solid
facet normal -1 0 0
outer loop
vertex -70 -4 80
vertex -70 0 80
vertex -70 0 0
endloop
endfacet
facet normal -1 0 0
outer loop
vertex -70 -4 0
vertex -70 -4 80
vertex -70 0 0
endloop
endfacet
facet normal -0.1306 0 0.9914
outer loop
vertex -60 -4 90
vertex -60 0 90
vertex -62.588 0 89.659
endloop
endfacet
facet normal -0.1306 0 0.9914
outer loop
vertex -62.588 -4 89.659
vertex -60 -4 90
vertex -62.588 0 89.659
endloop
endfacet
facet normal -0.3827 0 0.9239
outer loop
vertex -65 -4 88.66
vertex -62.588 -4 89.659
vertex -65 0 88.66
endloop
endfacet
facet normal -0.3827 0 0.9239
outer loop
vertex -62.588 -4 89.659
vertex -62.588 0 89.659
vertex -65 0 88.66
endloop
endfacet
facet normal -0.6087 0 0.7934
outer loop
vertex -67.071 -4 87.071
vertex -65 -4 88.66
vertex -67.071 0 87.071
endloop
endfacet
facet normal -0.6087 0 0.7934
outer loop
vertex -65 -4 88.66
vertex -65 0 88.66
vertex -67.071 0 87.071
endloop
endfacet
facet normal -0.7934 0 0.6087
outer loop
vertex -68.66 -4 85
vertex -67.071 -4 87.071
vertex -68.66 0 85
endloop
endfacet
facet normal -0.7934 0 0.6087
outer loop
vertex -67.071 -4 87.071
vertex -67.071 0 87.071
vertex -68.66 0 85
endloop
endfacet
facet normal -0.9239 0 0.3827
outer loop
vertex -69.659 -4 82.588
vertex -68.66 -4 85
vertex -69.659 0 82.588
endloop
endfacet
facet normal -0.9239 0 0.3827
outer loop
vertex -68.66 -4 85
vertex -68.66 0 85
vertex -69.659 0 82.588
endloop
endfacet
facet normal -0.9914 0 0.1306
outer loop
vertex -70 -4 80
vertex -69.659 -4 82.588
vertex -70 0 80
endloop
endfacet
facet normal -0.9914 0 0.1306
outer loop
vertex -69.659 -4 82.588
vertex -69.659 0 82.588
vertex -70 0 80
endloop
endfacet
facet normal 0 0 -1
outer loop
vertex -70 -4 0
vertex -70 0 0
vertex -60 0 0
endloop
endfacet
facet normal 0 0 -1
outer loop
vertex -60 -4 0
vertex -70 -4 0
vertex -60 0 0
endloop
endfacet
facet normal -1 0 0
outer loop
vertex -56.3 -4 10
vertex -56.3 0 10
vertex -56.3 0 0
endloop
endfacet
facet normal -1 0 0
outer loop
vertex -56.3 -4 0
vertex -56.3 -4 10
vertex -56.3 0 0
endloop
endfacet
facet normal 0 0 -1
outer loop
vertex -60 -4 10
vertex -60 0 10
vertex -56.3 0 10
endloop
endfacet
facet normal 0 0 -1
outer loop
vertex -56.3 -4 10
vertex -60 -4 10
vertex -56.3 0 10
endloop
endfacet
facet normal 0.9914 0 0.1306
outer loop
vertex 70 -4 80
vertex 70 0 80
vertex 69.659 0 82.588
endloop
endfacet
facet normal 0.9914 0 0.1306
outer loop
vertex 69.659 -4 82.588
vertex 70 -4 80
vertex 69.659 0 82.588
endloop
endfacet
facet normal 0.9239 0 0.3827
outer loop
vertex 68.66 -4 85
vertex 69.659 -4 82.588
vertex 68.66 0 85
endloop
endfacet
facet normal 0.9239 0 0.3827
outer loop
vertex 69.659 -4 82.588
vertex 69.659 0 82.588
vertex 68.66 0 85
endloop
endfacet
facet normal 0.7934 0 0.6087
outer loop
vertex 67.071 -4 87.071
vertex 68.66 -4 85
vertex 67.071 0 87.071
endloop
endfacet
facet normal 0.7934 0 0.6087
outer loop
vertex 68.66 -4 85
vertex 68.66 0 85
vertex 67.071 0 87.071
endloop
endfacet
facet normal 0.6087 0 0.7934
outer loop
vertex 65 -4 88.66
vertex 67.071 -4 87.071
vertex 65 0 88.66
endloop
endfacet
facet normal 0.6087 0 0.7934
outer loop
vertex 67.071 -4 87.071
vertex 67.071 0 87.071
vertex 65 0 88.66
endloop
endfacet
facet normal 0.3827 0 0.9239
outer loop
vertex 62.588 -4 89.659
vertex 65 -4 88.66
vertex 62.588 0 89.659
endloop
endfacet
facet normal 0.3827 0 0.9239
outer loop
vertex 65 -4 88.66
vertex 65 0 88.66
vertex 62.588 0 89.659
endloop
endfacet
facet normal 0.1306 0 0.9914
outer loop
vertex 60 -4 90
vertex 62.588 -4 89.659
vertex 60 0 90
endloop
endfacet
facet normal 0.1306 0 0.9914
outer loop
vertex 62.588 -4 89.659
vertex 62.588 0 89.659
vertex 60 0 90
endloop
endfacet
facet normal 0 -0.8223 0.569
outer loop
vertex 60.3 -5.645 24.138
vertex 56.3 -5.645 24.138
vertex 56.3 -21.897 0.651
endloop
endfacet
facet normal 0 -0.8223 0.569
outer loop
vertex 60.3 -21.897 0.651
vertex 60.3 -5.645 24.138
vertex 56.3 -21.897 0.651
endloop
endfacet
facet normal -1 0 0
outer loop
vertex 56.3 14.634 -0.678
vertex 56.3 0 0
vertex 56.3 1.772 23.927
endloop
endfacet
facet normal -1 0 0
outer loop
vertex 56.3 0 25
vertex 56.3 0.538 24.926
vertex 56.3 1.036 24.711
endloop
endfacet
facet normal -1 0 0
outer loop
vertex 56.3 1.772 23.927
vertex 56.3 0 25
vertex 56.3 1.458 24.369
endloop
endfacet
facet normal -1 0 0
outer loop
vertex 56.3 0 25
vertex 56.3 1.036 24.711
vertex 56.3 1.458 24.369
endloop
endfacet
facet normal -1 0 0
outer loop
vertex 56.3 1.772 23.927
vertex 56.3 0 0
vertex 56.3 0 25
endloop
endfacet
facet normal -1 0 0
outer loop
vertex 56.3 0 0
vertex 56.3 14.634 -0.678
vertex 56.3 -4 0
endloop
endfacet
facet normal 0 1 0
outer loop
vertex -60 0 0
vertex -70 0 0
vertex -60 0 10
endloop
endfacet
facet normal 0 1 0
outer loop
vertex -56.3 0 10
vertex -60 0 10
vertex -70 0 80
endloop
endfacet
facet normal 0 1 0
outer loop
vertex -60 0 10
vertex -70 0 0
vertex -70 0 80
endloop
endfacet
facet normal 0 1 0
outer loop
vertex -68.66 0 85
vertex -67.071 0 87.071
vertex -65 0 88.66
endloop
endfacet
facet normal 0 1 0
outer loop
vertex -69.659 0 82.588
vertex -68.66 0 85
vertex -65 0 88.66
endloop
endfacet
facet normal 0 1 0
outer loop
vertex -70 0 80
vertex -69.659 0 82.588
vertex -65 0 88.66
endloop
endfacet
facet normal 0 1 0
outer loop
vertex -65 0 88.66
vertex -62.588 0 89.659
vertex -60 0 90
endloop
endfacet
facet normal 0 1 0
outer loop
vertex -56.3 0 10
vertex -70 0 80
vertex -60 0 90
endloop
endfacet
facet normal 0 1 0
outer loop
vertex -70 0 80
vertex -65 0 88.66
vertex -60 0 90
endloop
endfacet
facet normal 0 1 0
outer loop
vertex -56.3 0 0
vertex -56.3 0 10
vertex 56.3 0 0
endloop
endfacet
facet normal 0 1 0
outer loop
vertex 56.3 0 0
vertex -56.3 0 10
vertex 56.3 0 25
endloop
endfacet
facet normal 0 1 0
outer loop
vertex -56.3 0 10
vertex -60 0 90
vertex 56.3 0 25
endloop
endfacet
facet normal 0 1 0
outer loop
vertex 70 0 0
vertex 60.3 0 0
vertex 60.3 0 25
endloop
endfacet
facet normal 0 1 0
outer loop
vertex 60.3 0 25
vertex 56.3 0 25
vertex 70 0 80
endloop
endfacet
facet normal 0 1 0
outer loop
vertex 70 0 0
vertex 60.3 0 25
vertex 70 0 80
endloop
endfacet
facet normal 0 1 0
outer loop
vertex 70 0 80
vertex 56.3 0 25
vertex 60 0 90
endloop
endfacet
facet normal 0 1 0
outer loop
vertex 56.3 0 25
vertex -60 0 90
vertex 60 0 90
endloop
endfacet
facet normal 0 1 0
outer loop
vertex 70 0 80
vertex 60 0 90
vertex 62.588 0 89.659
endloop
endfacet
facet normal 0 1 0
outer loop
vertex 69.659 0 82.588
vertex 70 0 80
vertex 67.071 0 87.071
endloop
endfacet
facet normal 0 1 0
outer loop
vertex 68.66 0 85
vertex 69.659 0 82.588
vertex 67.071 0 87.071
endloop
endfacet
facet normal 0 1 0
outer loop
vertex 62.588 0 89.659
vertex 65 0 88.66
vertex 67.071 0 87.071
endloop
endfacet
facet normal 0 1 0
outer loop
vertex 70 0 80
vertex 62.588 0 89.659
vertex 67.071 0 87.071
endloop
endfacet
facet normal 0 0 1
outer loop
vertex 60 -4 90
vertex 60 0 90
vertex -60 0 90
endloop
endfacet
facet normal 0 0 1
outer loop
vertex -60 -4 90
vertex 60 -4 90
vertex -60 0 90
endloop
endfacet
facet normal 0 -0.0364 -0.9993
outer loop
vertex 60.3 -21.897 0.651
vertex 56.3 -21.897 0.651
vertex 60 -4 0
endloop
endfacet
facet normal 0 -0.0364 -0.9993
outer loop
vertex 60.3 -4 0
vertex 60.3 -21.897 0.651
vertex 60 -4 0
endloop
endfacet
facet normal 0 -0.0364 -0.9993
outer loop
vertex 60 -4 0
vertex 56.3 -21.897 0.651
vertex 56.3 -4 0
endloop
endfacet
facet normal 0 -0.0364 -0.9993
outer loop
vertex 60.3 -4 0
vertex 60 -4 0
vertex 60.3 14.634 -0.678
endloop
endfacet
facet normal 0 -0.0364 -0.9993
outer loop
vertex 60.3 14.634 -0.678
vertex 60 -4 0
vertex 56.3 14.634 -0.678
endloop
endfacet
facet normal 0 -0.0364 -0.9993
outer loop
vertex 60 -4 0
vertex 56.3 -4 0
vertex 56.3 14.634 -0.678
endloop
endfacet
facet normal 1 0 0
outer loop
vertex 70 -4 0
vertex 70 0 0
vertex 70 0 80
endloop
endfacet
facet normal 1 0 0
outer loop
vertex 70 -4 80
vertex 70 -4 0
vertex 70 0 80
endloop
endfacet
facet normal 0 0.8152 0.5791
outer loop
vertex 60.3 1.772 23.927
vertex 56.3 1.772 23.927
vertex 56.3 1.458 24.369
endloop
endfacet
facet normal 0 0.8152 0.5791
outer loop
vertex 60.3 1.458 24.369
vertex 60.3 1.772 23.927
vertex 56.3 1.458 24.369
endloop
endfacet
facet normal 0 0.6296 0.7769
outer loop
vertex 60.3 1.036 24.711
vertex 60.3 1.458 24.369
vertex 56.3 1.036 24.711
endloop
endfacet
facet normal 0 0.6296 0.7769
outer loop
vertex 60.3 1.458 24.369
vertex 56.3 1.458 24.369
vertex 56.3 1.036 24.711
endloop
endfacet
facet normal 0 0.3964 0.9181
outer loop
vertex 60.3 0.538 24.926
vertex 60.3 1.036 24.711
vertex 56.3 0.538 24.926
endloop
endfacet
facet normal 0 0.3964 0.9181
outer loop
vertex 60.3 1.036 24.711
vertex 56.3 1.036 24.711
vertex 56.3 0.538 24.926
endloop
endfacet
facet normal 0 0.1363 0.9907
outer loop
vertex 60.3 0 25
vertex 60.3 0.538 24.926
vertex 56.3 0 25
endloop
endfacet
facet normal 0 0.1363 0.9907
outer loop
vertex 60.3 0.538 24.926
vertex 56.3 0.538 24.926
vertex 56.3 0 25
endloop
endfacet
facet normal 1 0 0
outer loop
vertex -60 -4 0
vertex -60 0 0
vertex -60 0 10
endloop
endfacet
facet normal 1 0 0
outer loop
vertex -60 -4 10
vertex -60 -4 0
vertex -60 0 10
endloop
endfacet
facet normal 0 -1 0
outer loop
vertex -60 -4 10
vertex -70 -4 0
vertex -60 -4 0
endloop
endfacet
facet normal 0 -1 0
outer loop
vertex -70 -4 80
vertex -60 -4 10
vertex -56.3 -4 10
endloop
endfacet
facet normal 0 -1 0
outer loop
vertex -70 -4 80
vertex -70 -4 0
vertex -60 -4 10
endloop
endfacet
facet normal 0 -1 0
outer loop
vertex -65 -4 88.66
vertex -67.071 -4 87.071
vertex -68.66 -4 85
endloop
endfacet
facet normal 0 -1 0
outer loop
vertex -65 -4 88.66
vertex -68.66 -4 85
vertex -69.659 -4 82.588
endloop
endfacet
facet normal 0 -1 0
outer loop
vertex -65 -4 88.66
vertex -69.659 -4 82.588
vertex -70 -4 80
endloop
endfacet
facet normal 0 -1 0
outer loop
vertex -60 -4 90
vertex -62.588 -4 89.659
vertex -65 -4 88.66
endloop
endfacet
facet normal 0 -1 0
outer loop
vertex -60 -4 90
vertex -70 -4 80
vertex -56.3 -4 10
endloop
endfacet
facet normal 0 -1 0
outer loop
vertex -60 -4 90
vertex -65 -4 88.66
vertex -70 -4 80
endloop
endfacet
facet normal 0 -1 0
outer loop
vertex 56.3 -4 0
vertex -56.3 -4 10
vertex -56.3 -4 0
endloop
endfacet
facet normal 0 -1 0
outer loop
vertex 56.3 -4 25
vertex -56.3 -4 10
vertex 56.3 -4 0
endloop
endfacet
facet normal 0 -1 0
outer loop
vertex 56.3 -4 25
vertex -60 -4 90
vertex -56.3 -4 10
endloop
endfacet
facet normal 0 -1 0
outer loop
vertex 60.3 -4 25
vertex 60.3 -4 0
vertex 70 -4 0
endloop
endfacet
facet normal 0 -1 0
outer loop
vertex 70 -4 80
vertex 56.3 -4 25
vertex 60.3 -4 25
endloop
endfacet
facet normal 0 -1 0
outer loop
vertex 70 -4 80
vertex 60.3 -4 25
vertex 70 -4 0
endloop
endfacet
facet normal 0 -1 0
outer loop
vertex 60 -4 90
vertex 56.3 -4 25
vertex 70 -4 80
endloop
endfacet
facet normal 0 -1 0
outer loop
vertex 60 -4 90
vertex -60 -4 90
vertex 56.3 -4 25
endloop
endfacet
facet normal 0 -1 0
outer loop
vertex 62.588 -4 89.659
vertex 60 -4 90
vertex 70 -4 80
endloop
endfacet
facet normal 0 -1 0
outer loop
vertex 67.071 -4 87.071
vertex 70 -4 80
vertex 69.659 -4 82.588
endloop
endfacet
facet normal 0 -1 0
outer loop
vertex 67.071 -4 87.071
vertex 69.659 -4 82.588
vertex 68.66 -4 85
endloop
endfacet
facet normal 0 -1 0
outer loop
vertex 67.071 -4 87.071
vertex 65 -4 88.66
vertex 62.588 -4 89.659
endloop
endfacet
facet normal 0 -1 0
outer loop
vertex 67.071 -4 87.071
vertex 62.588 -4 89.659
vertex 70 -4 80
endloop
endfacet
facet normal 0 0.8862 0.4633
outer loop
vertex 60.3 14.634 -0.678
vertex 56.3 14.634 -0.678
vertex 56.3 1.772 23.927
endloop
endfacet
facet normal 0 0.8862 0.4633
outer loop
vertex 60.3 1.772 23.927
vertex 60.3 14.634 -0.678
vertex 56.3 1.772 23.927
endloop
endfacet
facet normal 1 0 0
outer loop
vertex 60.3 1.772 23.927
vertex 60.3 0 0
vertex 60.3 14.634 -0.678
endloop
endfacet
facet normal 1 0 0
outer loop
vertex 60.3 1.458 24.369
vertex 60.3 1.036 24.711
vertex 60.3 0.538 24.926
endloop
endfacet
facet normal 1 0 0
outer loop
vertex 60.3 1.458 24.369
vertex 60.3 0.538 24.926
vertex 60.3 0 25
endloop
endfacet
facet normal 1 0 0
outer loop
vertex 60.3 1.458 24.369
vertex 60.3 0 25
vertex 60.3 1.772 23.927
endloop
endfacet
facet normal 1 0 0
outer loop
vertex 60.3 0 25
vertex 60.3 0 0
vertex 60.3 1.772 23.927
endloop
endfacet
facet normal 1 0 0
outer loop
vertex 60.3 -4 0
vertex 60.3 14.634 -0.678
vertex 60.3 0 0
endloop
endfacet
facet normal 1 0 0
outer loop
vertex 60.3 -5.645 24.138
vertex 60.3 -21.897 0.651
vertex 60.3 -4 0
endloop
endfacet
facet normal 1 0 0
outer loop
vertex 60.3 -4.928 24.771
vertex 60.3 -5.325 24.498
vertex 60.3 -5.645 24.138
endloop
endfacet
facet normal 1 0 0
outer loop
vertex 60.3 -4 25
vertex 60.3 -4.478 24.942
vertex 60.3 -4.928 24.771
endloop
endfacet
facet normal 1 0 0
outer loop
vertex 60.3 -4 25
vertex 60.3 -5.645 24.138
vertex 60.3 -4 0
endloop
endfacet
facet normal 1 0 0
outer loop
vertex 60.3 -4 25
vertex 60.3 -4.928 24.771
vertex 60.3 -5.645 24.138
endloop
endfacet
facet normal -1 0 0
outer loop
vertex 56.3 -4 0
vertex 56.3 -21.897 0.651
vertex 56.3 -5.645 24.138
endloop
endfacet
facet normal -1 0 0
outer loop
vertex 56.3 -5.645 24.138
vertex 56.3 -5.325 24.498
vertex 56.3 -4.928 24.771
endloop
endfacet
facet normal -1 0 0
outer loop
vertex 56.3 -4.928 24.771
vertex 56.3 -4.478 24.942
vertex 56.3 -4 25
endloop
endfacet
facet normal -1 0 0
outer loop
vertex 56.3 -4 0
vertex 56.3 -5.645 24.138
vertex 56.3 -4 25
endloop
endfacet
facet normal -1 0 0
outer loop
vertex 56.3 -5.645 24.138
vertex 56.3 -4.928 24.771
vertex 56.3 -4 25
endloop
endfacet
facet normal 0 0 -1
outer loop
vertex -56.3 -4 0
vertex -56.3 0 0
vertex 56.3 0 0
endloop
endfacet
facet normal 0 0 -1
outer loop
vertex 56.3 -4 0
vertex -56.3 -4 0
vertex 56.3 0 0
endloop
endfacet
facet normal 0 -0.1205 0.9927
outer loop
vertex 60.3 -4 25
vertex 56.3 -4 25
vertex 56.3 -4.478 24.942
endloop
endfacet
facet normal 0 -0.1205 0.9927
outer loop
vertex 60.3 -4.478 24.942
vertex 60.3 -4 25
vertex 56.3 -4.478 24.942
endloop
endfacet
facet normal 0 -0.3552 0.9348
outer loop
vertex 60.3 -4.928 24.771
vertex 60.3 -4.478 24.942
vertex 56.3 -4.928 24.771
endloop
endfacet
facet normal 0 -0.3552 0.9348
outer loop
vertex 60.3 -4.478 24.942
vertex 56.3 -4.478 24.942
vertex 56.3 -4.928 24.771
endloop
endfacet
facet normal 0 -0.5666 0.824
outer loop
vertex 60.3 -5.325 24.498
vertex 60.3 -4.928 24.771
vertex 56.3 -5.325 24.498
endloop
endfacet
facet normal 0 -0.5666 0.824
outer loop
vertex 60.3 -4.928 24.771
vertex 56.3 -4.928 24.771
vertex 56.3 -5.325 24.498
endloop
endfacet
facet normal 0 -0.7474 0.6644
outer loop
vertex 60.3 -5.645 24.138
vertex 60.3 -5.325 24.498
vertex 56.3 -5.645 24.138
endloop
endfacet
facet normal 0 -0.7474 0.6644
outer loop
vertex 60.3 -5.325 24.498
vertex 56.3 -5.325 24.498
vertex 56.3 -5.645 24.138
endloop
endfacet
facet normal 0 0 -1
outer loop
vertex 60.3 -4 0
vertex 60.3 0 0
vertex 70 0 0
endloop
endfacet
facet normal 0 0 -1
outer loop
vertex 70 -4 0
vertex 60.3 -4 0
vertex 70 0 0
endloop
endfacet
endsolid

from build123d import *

# Parameters (mm, degrees)
F1_DEPTH = 4
F3_DEPTH = 4


with BuildPart() as f1:
    # F0 (on Front) → F1 (new body)
    with BuildSketch(Plane.XZ):
        with BuildLine():
            Line((60, 90), (-60, 90))
            ThreePointArc((-60, 90), (-67.0710678119, 87.0710678119), (-70, 80))
            Line((-70, 80), (-70, 0))
            Line((-70, 0), (-60, 0))
            Line((-60, 0), (-60, 10))
            Line((-60, 10), (-56.3, 10))
            Line((-56.3, 10), (-56.3, 0))
            Line((-56.3, 0), (56.3, 0))
            Line((56.3, 0), (56.3, 10))
            Line((56.3, 10), (60, 10))
            Line((60, 10), (60, 0))
            Line((60, 0), (70, 0))
            Line((70, 0), (70, 80))
            ThreePointArc((70, 80), (67.0710678119, 87.0710678119), (60, 90))
        make_face()
    extrude(amount=F1_DEPTH)

    # F2 (on face) → F3 (join)
    with BuildSketch(Plane.YZ.offset(56.3)):
        with BuildLine():
            Line((0, 25), (0, 10))
            Line((0, 10), (-4, 10))
            Line((-4, 10), (-4, 25))
            ThreePointArc((-4, 25), (-4.9283988219, 24.7714614383), (-5.6446227124, 24.1380756275))
            Line((-5.6446227124, 24.1380756275), (-21.8974136828, 0.6513155869))
            Line((-21.8974136828, 0.6513155869), (14.6343906331, -0.67813536))
            Line((14.6343906331, -0.67813536), (1.7724384249, 23.9265322606))
            ThreePointArc((1.7724384249, 23.9265322606), (1.0360828825, 24.7107110395), (0, 25))
        make_face()
    extrude(amount=F3_DEPTH)


solid = f1.part
